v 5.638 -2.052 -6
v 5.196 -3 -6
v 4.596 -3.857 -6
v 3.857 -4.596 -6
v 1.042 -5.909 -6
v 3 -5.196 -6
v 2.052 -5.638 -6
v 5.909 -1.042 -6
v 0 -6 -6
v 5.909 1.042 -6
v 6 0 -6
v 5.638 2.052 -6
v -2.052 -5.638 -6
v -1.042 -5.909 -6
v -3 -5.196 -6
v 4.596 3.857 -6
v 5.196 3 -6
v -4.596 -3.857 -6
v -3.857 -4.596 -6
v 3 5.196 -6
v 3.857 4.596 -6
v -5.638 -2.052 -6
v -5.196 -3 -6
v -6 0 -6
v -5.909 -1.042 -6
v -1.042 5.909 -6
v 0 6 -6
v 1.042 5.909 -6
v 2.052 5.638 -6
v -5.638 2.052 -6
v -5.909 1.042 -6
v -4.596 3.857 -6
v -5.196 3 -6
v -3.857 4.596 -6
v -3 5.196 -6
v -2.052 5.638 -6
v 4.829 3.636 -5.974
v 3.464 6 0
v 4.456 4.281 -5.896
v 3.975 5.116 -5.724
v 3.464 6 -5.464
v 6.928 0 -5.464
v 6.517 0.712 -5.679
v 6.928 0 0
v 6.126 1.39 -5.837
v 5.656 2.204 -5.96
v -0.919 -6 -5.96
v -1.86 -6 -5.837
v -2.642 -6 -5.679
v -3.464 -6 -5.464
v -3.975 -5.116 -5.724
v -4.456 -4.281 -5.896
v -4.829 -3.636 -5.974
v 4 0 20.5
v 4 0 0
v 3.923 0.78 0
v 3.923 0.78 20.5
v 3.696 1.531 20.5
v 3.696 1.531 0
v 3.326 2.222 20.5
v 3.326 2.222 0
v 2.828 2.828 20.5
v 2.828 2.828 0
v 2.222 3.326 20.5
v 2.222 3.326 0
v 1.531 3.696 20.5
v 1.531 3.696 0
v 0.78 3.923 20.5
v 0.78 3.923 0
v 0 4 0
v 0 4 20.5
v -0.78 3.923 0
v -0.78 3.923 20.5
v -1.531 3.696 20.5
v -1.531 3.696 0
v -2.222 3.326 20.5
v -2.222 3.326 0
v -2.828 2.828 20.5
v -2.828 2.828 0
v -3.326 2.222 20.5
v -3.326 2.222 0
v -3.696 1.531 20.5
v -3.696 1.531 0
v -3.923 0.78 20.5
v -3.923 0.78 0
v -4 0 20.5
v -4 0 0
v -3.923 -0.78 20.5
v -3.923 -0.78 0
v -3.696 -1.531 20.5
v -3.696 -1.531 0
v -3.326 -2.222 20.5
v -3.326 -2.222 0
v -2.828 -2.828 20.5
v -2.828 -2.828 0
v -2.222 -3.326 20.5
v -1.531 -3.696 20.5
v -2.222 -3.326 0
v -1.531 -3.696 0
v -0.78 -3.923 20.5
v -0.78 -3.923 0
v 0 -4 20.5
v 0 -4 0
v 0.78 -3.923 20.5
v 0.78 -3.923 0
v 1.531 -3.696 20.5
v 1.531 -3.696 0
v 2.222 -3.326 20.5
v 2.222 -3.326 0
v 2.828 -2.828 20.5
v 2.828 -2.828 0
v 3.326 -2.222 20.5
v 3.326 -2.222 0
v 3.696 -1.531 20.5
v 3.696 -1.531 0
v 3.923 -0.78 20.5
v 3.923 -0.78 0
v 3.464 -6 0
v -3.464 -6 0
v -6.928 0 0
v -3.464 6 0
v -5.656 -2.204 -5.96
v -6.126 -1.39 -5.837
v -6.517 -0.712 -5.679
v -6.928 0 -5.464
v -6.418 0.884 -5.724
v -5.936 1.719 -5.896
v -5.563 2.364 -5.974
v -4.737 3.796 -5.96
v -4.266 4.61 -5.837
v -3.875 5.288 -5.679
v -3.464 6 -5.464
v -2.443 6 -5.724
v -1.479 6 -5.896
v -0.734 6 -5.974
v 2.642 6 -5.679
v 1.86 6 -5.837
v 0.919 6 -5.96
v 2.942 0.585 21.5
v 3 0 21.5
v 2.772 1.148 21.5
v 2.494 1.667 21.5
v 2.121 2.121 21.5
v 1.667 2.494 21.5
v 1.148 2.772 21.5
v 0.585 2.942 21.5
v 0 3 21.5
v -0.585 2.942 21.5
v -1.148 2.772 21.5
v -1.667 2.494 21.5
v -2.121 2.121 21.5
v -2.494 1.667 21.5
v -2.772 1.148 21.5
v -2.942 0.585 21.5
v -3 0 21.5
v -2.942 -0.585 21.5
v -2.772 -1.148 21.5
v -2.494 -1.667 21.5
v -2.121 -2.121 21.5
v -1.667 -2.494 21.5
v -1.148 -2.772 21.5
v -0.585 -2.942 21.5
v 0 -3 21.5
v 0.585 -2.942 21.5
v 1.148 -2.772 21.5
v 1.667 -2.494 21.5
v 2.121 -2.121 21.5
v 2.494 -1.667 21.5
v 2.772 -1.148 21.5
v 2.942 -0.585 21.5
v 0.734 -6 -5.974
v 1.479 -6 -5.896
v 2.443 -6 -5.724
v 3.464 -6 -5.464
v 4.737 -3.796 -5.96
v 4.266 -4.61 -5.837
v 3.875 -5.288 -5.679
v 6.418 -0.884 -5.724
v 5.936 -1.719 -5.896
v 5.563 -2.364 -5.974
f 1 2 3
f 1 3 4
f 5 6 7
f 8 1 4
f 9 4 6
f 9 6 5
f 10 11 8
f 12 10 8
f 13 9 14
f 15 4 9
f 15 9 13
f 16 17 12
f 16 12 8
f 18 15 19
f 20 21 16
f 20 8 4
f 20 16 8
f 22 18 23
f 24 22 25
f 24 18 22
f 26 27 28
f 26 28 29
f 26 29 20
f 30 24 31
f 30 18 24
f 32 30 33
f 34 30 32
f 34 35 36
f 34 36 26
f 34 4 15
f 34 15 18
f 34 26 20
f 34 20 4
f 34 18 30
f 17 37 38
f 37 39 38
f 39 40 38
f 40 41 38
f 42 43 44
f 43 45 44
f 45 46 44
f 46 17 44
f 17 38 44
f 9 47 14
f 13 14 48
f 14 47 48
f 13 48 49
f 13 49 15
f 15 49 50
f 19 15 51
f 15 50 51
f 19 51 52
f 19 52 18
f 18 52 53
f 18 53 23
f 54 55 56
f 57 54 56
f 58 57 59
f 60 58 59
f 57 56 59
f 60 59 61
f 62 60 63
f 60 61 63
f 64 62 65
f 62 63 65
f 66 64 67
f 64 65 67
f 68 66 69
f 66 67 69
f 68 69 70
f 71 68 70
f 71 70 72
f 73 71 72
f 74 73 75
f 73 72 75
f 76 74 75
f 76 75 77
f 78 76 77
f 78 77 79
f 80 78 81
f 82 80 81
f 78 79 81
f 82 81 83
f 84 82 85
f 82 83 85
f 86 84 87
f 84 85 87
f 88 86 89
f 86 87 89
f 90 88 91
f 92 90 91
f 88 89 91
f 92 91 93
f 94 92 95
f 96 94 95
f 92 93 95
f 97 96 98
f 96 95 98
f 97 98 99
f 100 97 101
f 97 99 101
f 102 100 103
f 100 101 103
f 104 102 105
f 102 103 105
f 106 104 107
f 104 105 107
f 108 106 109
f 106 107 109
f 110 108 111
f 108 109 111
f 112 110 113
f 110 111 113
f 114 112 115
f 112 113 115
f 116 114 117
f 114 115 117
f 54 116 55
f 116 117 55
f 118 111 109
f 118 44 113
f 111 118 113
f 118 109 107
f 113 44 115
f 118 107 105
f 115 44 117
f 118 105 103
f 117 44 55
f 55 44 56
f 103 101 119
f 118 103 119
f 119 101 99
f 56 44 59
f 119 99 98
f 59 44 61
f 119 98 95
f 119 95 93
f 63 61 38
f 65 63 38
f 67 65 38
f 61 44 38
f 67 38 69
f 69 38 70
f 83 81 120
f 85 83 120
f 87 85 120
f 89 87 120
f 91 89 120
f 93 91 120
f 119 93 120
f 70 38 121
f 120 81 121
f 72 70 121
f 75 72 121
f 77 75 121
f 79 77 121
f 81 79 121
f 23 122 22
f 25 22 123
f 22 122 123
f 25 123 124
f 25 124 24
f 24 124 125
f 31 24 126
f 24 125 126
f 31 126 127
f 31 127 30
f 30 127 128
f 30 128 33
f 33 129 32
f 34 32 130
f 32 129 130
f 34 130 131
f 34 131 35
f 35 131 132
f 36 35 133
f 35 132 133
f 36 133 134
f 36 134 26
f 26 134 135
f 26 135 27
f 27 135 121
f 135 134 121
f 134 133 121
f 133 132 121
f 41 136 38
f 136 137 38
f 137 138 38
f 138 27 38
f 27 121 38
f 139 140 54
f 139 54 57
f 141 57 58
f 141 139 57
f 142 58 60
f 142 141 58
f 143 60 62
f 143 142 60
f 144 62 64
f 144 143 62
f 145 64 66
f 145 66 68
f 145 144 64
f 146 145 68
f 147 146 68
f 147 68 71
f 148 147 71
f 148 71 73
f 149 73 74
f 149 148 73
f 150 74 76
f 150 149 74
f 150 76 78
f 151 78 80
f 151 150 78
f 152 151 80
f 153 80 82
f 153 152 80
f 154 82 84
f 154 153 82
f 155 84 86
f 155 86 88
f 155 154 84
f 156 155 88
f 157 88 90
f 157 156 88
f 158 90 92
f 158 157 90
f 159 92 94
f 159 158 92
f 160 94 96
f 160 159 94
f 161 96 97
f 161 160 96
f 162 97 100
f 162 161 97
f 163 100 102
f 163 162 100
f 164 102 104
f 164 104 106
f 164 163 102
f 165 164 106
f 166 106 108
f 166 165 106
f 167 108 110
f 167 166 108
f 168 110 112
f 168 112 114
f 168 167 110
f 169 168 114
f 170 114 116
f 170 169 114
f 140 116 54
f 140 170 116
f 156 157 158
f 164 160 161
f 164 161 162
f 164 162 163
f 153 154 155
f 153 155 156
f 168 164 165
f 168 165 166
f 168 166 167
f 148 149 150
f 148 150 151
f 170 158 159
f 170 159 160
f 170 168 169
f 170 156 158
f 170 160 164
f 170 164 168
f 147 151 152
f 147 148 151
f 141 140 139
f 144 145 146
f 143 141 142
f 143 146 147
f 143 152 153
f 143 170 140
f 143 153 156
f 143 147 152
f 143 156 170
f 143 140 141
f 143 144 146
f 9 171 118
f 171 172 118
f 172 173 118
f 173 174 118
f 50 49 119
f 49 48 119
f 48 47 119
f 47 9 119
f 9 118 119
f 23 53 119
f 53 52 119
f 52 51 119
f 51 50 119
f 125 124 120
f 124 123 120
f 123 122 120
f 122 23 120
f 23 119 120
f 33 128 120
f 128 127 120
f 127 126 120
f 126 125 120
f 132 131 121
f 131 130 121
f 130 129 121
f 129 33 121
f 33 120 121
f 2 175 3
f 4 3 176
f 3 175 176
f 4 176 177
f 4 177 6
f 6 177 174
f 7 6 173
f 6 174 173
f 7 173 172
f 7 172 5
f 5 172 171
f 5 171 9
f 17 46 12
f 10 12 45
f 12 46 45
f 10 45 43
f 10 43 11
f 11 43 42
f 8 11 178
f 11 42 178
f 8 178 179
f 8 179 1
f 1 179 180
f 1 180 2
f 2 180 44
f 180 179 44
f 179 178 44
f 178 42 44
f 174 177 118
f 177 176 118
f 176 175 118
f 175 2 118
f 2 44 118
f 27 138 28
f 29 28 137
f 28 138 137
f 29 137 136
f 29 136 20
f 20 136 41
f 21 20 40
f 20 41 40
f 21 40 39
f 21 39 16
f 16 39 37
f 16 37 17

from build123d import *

# Parameters (mm, degrees)
SKETCH_2_R      = 4
EXTRUDE_1_DEPTH = 21.5
EXTRUDE_2_DEPTH = 6
CHAMFER_1_SIZE  = 1


with BuildPart() as part:
    # 草圖2 → 伸長1 (new body)
    with BuildSketch(Plane.XY):
        Circle(SKETCH_2_R)
    extrude(amount=EXTRUDE_1_DEPTH)

    # 草圖3 → 伸長2 (add)
    with BuildSketch(Plane(origin=(0, 0, 0), x_dir=(-1, 0, 0), z_dir=(0, 0, -1))):
        Polygon((3.464101615, -6), (6.92820323, 0), (3.464101615, 6), (-3.464101615, 6), (-6.92820323, 0), (-3.464101615, -6), align=None)
    extrude(amount=EXTRUDE_2_DEPTH)

    # 草圖5 → 除料-旋轉1 (revolve, cut)
    with BuildSketch(Plane(origin=(0, 0, 0), x_dir=(1, 0, 0), z_dir=(0, 1, 0)), mode=Mode.PRIVATE) as cut_revolve_1_sk:
        Polygon((6.92820323, 5.464101615), (6.92820323, 6), (6, 6), align=None)
    revolve(cut_revolve_1_sk.sketch.rotate(Axis((0, 0, 0), (0, 0, -1)), 180), axis=Axis((0, 0, 0), (0, 0, -1)), mode=Mode.SUBTRACT)

    # 導角1
    chamfer_1_edges = [part.edges().sort_by_distance(p)[0] for p in [
        (-4, 0, 21.5),
    ]]
    chamfer(chamfer_1_edges, length=CHAMFER_1_SIZE)


solid = part.part
